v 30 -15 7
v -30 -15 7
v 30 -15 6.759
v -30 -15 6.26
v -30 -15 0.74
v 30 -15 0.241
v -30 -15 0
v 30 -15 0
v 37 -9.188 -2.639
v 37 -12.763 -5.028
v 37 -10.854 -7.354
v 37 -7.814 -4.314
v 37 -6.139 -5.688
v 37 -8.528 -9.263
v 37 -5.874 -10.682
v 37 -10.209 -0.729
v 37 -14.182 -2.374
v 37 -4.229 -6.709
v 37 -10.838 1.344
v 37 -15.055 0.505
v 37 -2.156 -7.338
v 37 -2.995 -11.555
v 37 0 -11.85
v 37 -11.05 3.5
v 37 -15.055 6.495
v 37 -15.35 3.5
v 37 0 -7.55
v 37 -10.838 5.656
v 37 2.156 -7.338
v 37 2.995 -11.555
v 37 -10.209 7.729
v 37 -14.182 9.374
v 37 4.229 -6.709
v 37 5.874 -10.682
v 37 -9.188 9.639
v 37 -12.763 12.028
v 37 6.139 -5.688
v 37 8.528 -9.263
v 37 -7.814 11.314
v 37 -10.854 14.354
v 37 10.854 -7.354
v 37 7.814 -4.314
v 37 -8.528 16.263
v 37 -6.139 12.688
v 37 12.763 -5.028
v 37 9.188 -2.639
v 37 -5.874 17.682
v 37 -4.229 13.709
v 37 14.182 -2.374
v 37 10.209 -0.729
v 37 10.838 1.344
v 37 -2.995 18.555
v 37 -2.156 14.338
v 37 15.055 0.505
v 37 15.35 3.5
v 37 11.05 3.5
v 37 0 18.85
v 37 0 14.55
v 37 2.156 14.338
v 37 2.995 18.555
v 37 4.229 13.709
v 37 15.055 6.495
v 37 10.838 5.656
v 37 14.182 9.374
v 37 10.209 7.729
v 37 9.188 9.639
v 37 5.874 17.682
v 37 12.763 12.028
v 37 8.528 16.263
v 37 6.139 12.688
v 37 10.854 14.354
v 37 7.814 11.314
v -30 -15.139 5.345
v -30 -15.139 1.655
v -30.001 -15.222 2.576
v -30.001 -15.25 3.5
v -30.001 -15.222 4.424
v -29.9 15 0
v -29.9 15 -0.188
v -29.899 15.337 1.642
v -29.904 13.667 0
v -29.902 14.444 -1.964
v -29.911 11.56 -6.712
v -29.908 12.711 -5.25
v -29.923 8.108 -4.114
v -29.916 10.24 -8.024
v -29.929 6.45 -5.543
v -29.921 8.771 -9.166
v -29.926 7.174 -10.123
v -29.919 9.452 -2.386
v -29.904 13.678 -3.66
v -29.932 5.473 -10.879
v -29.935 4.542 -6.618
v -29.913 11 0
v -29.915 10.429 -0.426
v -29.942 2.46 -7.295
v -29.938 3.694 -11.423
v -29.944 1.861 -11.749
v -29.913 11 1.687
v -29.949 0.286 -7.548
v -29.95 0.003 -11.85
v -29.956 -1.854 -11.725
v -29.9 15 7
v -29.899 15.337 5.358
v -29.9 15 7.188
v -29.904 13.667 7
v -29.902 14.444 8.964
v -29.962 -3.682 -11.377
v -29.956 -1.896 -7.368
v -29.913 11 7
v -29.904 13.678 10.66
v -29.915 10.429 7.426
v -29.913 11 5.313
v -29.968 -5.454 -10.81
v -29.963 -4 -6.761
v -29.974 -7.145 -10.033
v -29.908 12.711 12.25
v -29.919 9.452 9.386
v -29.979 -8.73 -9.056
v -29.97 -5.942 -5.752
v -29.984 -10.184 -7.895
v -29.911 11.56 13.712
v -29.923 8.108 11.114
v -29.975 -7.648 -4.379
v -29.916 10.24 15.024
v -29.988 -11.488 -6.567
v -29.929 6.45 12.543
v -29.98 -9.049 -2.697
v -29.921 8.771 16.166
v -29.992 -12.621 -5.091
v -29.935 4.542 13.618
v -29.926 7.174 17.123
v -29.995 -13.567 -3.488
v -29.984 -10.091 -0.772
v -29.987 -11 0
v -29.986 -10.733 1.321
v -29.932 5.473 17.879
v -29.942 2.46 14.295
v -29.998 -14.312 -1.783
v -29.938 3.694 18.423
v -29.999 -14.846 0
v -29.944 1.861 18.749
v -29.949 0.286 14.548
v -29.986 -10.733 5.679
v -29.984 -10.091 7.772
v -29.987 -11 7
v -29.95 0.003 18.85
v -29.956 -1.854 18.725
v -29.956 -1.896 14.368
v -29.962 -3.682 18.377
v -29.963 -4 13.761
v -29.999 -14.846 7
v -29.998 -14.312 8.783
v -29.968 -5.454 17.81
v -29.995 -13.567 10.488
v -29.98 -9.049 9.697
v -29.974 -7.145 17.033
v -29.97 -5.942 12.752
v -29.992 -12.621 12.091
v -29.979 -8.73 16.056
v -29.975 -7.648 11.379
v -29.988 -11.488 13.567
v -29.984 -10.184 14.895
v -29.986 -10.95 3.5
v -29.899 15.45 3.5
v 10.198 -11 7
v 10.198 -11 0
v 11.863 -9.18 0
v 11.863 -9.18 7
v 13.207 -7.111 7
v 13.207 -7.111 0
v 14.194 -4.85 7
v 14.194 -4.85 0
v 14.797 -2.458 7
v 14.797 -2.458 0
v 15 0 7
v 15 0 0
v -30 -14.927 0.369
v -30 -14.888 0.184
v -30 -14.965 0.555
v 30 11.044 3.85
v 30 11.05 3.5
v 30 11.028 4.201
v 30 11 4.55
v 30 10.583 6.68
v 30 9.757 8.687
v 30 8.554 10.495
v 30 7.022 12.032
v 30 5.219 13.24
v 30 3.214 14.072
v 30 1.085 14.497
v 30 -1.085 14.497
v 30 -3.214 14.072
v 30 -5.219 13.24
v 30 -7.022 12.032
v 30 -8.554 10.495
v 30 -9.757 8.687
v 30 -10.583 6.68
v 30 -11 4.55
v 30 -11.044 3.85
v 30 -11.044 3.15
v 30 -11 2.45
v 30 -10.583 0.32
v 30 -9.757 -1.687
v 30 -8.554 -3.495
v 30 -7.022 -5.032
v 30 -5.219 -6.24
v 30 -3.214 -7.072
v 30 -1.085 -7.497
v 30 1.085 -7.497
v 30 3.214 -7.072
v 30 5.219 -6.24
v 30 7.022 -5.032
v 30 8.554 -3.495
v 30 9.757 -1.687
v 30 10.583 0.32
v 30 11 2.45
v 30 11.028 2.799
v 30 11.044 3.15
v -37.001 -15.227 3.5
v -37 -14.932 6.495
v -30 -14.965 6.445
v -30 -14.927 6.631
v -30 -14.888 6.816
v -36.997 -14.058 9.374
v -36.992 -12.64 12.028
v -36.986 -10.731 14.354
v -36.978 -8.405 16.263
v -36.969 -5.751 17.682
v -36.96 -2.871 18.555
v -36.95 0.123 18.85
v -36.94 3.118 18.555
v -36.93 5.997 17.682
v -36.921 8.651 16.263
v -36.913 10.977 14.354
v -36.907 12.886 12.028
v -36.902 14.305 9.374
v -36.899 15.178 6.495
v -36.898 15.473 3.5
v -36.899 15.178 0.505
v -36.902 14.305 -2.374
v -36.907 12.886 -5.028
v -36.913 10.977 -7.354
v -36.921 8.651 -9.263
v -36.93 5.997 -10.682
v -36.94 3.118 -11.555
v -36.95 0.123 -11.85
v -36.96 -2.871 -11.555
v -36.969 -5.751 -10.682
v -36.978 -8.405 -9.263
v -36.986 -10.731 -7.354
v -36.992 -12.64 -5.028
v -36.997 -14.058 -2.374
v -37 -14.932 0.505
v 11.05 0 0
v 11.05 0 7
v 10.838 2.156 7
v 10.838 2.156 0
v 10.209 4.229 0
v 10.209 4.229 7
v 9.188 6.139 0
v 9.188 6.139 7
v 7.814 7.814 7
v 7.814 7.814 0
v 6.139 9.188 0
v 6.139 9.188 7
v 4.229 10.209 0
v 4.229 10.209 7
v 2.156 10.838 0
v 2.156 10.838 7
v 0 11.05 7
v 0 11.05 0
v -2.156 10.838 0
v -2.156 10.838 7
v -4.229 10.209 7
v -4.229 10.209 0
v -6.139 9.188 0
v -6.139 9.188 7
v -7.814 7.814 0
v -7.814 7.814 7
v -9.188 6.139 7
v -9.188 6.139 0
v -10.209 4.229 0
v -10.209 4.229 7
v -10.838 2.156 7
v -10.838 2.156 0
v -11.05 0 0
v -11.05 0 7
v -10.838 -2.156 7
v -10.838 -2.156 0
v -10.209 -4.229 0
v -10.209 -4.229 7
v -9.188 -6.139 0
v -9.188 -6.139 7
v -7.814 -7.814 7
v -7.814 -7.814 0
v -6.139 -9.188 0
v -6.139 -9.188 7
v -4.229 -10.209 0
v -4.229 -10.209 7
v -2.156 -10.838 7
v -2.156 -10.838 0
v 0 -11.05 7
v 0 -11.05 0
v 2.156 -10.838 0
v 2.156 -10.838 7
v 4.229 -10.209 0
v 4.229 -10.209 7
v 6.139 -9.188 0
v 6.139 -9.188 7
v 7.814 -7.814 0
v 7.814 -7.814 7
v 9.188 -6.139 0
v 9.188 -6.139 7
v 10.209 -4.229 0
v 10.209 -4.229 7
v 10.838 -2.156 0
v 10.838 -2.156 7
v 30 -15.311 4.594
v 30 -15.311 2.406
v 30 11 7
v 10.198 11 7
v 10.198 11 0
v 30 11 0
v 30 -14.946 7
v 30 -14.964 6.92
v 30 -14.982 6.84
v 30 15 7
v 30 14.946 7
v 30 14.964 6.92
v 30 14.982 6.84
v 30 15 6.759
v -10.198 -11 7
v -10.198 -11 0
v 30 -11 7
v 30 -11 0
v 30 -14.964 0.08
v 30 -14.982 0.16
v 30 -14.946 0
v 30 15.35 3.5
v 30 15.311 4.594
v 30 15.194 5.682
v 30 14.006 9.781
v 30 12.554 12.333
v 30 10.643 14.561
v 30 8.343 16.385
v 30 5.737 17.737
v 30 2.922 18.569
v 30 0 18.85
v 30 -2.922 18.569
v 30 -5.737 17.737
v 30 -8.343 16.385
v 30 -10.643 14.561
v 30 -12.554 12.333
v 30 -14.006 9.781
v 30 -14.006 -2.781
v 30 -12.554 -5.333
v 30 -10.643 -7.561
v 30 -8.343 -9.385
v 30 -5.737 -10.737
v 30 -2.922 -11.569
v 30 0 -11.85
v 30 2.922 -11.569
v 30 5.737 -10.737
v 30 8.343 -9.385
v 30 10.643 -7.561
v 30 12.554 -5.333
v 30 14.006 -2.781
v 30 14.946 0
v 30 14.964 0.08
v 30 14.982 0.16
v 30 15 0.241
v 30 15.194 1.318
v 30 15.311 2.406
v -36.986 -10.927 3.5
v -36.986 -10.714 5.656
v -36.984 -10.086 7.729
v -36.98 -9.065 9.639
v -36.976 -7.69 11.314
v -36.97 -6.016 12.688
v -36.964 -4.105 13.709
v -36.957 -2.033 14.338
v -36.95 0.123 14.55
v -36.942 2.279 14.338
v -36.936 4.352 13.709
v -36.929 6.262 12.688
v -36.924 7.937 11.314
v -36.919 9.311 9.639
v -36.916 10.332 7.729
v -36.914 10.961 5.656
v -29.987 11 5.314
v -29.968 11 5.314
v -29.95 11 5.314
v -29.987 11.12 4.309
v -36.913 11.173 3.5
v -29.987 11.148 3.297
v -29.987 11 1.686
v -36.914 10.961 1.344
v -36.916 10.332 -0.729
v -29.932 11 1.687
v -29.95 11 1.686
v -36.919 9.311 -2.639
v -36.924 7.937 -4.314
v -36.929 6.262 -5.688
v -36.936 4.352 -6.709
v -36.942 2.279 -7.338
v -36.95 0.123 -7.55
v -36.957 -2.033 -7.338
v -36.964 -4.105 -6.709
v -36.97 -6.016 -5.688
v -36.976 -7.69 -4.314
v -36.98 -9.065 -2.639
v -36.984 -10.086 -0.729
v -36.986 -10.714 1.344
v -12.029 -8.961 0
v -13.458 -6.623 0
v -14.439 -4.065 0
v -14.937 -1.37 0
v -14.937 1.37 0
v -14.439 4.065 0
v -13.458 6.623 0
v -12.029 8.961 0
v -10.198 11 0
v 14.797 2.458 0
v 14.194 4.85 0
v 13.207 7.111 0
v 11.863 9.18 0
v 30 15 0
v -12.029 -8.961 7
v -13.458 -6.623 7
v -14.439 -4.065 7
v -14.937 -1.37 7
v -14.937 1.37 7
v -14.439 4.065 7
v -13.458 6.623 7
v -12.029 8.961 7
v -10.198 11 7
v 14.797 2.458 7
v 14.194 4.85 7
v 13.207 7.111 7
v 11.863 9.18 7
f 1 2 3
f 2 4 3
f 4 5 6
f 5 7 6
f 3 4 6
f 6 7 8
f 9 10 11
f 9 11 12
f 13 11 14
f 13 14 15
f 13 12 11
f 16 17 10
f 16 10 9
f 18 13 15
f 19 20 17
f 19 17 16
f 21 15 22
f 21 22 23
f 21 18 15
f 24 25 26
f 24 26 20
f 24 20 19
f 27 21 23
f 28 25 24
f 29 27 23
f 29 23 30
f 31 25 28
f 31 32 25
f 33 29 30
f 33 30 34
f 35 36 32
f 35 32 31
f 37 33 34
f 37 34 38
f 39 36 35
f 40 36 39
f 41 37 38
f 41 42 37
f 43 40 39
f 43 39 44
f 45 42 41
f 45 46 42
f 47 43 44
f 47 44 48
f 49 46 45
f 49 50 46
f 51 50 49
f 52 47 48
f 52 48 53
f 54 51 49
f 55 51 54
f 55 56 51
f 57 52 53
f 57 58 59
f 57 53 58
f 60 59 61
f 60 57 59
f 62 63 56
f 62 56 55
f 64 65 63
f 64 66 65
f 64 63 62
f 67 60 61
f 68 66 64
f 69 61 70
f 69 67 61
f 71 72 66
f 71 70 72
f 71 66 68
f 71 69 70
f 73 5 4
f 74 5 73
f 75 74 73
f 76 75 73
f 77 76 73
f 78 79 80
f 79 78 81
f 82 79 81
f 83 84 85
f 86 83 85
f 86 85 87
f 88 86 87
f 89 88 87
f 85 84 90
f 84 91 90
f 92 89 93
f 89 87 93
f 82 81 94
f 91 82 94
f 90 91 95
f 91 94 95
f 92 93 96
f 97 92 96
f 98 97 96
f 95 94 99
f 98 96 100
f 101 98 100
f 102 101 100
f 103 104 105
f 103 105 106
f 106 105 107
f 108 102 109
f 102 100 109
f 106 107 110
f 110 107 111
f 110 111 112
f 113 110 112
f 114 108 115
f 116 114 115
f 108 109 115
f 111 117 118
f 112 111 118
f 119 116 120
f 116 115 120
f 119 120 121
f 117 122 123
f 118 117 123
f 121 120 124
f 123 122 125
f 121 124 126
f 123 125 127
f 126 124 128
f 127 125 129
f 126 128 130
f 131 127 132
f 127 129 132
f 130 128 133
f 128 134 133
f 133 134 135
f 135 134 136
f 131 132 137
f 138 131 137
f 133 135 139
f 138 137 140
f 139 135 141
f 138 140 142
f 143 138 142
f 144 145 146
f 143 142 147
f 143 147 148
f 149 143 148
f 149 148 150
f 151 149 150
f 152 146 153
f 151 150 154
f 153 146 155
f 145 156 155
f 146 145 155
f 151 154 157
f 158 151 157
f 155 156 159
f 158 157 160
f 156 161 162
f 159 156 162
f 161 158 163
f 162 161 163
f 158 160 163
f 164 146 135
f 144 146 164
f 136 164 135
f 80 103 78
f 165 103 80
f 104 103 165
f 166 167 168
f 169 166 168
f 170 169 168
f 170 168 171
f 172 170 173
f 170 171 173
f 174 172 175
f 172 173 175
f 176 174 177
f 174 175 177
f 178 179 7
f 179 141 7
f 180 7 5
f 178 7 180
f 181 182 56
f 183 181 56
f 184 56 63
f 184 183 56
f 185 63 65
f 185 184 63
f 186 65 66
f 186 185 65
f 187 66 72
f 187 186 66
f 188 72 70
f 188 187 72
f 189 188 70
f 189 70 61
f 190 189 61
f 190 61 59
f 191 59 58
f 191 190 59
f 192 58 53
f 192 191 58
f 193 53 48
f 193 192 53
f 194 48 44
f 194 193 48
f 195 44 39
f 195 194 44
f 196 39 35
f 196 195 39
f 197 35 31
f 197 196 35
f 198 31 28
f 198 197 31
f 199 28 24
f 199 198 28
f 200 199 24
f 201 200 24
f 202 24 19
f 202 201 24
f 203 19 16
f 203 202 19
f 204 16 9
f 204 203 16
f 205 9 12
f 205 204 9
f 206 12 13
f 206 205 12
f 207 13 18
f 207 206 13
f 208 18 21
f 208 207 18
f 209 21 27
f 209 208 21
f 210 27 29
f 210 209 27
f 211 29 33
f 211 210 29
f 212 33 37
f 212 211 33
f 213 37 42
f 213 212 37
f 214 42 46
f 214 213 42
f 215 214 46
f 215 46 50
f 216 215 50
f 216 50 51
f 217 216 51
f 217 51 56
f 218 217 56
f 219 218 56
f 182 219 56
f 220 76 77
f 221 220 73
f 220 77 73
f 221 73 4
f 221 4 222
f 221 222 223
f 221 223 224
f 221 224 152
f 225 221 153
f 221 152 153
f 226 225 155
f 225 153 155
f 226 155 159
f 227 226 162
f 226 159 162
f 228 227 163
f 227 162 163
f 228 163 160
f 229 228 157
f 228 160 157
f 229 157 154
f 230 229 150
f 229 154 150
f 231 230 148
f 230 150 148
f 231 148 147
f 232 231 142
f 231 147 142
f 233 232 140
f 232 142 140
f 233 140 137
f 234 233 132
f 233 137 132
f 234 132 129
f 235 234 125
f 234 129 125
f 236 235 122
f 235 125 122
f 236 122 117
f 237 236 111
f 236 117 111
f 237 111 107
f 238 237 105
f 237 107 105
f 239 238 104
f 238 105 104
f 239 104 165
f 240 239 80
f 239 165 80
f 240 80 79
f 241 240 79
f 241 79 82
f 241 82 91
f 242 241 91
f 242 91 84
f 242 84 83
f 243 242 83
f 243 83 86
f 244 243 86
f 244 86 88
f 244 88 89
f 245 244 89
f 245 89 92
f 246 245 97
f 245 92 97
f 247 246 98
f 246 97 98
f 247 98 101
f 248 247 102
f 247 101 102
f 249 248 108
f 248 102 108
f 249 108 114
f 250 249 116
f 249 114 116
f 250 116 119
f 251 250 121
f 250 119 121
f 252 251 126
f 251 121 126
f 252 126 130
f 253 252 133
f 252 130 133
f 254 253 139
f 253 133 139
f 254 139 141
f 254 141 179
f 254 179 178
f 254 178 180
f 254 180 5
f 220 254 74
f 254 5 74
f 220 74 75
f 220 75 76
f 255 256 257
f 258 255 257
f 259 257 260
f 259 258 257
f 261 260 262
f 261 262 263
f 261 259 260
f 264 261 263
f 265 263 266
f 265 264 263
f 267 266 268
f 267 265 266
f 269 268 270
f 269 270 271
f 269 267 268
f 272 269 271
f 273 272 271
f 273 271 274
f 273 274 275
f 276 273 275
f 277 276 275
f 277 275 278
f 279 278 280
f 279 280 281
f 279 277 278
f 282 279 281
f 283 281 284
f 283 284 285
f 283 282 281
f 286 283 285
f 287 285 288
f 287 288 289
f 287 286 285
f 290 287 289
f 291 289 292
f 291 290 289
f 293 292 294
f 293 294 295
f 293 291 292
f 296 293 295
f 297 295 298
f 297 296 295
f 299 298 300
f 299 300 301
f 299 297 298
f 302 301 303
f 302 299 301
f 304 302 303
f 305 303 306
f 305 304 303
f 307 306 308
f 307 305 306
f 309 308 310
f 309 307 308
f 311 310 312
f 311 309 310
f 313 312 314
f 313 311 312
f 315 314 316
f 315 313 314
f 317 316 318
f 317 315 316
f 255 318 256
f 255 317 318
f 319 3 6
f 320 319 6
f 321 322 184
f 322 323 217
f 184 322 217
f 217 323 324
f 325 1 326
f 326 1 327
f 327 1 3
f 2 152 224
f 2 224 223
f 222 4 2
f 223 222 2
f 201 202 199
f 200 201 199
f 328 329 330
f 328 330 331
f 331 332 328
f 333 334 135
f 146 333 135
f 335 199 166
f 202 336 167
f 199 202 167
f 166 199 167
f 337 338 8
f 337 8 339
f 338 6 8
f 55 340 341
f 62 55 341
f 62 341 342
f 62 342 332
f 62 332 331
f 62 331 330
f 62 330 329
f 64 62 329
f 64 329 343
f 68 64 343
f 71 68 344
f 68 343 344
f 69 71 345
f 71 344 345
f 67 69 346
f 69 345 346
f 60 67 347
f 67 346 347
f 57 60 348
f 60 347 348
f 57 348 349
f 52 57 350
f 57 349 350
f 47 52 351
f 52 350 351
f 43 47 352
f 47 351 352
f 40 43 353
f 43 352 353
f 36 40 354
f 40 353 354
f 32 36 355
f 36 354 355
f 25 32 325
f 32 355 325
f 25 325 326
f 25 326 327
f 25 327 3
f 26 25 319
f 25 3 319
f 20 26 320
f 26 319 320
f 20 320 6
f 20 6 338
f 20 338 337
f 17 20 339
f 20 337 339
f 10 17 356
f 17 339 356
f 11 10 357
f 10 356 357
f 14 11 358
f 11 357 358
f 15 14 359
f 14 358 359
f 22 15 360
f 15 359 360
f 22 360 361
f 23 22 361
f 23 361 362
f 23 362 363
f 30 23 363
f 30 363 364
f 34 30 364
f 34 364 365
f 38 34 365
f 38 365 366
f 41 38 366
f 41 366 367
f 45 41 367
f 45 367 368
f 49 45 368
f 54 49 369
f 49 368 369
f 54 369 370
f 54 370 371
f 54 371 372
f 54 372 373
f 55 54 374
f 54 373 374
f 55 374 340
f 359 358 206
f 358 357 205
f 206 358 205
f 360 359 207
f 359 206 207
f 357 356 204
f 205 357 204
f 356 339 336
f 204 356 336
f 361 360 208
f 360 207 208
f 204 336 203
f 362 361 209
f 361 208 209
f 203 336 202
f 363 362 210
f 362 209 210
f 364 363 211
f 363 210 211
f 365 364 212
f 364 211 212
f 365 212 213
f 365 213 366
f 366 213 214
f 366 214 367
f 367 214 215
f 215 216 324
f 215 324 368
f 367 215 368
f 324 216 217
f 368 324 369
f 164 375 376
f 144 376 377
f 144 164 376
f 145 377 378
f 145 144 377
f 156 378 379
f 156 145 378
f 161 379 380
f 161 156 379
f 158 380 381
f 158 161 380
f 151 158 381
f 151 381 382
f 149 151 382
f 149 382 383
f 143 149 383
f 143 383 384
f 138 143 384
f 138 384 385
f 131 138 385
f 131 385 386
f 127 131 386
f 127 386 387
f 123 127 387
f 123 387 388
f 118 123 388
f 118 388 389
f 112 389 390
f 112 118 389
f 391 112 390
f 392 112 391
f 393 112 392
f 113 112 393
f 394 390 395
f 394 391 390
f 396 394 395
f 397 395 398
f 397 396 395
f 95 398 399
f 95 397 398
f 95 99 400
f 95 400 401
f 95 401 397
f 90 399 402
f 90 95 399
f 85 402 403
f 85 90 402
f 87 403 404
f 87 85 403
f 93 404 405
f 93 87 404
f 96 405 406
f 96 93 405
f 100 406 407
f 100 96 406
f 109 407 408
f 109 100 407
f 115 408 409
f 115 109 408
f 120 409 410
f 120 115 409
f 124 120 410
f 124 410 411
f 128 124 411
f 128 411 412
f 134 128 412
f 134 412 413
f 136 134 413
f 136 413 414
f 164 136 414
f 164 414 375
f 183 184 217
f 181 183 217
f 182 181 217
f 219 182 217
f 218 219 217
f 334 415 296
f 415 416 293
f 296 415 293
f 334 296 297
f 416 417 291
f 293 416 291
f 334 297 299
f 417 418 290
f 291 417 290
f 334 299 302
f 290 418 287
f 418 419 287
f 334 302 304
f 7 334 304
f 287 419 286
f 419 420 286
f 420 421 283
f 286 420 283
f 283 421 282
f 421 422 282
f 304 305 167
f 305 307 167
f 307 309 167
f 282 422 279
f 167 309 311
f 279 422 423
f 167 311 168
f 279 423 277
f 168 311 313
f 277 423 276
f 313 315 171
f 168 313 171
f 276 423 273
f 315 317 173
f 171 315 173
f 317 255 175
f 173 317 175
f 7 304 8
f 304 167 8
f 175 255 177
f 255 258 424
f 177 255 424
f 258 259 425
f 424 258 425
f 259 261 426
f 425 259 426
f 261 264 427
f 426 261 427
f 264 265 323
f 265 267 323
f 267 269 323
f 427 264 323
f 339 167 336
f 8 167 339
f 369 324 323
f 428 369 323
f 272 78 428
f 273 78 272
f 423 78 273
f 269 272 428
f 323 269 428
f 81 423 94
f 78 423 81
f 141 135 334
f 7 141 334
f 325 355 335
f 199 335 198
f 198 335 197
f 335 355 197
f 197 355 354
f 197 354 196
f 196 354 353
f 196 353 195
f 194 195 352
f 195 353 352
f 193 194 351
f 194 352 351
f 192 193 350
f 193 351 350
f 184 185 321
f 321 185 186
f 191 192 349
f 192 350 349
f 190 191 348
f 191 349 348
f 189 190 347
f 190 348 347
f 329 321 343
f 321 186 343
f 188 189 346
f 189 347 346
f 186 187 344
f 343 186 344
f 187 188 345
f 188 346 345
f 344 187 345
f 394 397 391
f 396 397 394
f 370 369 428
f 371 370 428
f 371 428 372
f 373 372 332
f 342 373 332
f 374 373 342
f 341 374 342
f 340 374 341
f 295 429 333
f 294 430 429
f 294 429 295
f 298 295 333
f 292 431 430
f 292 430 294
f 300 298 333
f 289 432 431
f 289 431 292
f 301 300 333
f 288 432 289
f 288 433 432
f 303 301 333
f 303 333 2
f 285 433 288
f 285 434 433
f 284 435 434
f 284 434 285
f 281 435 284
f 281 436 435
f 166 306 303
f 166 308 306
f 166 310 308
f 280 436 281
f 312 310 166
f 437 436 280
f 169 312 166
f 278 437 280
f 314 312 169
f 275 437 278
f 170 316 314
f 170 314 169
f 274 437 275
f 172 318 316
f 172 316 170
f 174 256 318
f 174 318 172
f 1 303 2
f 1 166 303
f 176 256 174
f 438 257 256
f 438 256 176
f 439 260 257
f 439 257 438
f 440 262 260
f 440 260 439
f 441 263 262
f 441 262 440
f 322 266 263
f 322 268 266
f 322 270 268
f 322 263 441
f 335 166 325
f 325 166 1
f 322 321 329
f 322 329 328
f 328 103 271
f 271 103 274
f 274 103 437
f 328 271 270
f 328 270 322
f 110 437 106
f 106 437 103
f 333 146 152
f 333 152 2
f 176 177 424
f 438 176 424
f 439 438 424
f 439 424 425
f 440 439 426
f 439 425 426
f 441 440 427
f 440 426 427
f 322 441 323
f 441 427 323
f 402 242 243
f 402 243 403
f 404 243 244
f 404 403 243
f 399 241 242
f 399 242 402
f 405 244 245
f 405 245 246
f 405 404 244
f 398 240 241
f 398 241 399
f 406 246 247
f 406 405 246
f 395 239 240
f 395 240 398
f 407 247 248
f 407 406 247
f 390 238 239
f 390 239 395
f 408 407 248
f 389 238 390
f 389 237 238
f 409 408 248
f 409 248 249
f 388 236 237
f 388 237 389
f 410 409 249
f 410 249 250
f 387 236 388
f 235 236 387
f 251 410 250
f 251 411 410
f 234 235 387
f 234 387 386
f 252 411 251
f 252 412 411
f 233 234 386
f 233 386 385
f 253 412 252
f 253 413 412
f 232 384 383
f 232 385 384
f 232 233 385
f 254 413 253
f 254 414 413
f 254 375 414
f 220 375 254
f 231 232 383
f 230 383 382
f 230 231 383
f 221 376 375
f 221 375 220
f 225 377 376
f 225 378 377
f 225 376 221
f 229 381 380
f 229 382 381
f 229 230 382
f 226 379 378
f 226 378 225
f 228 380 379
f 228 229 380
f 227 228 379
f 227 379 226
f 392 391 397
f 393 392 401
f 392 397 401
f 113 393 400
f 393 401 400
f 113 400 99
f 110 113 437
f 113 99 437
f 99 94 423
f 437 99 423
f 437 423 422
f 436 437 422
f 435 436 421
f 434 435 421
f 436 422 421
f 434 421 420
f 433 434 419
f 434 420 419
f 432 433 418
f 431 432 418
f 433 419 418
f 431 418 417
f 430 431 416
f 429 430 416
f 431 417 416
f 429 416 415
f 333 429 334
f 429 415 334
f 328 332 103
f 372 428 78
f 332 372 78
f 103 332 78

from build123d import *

# Parameters (mm, degrees)
F0_R     = 11.05
F1_DEPTH = 7
F2_R     = 15.35
F2_R_2   = 11.05
F3_DEPTH = 7
F4_R     = 15.35
F4_R_2   = 11.05
F5_DEPTH = 7


with BuildPart() as f1:
    # F0 (on Top) → F1 (new body)
    with BuildSketch(Plane.XY):
        with BuildLine():
            ThreePointArc((10.198039, -11), (13.747192, -6.001225), (15, 0))
            ThreePointArc((15, 0), (13.747192, 6.001225), (10.198039, 11))
            ThreePointArc((10.198039, 11), (5.477226, 13.96424), (0, 15))
            ThreePointArc((0, 15), (-5.477226, 13.96424), (-10.198039, 11))
            ThreePointArc((-10.198039, 11), (-15, 0), (-10.198039, -11))
            ThreePointArc((-10.198039, -11), (-5.477226, -13.96424), (0, -15))
            ThreePointArc((0, -15), (5.477226, -13.96424), (10.198039, -11))
        make_face()
        Circle(F0_R, mode=Mode.SUBTRACT)
        with BuildLine():
            ThreePointArc((0, 15), (5.477226, 13.96424), (10.198039, 11))
            Line((10.198039, 11), (30, 11))
            Line((30, 11), (30, 15))
            Line((30, 15), (0, 15))
        make_face()
        with BuildLine():
            Line((30, -11), (10.198039, -11))
            ThreePointArc((10.198039, -11), (5.477226, -13.96424), (0, -15))
            Line((0, -15), (30, -15))
            Line((30, -15), (30, -11))
        make_face()
        with BuildLine():
            ThreePointArc((-10.198039, 11), (-5.477226, 13.96424), (0, 15))
            Line((0, 15), (-30, 15))
            Line((-30, 15), (-29.986673, 11))
            Line((-29.986673, 11), (-10.198039, 11))
        make_face()
        with BuildLine():
            Line((-30, -15), (0, -15))
            ThreePointArc((0, -15), (-5.477226, -13.96424), (-10.198039, -11))
            Line((-10.198039, -11), (-29.98667, -11))
            Line((-29.98667, -11), (-30, -15))
        make_face()
    extrude(amount=F1_DEPTH)

    # F2 (on face) → F3 (join)
    with BuildSketch(Plane(origin=(-29.949681, 0.099805, 0), x_dir=(-0.003332, -0.999994, 0), z_dir=(-0.999994, 0.003332, 0))):
        with Locations((0, 3.5)):
            Circle(F2_R)
        with Locations((0, 3.5)):
            Circle(F2_R_2, mode=Mode.SUBTRACT)
    extrude(amount=F3_DEPTH)

    # F4 (on face) → F5 (join)
    with BuildSketch(Plane.YZ.offset(30)):
        with Locations((0, 3.5)):
            Circle(F4_R)
        with Locations((0, 3.5)):
            Circle(F4_R_2, mode=Mode.SUBTRACT)
    extrude(amount=F5_DEPTH)


solid = f1.part
